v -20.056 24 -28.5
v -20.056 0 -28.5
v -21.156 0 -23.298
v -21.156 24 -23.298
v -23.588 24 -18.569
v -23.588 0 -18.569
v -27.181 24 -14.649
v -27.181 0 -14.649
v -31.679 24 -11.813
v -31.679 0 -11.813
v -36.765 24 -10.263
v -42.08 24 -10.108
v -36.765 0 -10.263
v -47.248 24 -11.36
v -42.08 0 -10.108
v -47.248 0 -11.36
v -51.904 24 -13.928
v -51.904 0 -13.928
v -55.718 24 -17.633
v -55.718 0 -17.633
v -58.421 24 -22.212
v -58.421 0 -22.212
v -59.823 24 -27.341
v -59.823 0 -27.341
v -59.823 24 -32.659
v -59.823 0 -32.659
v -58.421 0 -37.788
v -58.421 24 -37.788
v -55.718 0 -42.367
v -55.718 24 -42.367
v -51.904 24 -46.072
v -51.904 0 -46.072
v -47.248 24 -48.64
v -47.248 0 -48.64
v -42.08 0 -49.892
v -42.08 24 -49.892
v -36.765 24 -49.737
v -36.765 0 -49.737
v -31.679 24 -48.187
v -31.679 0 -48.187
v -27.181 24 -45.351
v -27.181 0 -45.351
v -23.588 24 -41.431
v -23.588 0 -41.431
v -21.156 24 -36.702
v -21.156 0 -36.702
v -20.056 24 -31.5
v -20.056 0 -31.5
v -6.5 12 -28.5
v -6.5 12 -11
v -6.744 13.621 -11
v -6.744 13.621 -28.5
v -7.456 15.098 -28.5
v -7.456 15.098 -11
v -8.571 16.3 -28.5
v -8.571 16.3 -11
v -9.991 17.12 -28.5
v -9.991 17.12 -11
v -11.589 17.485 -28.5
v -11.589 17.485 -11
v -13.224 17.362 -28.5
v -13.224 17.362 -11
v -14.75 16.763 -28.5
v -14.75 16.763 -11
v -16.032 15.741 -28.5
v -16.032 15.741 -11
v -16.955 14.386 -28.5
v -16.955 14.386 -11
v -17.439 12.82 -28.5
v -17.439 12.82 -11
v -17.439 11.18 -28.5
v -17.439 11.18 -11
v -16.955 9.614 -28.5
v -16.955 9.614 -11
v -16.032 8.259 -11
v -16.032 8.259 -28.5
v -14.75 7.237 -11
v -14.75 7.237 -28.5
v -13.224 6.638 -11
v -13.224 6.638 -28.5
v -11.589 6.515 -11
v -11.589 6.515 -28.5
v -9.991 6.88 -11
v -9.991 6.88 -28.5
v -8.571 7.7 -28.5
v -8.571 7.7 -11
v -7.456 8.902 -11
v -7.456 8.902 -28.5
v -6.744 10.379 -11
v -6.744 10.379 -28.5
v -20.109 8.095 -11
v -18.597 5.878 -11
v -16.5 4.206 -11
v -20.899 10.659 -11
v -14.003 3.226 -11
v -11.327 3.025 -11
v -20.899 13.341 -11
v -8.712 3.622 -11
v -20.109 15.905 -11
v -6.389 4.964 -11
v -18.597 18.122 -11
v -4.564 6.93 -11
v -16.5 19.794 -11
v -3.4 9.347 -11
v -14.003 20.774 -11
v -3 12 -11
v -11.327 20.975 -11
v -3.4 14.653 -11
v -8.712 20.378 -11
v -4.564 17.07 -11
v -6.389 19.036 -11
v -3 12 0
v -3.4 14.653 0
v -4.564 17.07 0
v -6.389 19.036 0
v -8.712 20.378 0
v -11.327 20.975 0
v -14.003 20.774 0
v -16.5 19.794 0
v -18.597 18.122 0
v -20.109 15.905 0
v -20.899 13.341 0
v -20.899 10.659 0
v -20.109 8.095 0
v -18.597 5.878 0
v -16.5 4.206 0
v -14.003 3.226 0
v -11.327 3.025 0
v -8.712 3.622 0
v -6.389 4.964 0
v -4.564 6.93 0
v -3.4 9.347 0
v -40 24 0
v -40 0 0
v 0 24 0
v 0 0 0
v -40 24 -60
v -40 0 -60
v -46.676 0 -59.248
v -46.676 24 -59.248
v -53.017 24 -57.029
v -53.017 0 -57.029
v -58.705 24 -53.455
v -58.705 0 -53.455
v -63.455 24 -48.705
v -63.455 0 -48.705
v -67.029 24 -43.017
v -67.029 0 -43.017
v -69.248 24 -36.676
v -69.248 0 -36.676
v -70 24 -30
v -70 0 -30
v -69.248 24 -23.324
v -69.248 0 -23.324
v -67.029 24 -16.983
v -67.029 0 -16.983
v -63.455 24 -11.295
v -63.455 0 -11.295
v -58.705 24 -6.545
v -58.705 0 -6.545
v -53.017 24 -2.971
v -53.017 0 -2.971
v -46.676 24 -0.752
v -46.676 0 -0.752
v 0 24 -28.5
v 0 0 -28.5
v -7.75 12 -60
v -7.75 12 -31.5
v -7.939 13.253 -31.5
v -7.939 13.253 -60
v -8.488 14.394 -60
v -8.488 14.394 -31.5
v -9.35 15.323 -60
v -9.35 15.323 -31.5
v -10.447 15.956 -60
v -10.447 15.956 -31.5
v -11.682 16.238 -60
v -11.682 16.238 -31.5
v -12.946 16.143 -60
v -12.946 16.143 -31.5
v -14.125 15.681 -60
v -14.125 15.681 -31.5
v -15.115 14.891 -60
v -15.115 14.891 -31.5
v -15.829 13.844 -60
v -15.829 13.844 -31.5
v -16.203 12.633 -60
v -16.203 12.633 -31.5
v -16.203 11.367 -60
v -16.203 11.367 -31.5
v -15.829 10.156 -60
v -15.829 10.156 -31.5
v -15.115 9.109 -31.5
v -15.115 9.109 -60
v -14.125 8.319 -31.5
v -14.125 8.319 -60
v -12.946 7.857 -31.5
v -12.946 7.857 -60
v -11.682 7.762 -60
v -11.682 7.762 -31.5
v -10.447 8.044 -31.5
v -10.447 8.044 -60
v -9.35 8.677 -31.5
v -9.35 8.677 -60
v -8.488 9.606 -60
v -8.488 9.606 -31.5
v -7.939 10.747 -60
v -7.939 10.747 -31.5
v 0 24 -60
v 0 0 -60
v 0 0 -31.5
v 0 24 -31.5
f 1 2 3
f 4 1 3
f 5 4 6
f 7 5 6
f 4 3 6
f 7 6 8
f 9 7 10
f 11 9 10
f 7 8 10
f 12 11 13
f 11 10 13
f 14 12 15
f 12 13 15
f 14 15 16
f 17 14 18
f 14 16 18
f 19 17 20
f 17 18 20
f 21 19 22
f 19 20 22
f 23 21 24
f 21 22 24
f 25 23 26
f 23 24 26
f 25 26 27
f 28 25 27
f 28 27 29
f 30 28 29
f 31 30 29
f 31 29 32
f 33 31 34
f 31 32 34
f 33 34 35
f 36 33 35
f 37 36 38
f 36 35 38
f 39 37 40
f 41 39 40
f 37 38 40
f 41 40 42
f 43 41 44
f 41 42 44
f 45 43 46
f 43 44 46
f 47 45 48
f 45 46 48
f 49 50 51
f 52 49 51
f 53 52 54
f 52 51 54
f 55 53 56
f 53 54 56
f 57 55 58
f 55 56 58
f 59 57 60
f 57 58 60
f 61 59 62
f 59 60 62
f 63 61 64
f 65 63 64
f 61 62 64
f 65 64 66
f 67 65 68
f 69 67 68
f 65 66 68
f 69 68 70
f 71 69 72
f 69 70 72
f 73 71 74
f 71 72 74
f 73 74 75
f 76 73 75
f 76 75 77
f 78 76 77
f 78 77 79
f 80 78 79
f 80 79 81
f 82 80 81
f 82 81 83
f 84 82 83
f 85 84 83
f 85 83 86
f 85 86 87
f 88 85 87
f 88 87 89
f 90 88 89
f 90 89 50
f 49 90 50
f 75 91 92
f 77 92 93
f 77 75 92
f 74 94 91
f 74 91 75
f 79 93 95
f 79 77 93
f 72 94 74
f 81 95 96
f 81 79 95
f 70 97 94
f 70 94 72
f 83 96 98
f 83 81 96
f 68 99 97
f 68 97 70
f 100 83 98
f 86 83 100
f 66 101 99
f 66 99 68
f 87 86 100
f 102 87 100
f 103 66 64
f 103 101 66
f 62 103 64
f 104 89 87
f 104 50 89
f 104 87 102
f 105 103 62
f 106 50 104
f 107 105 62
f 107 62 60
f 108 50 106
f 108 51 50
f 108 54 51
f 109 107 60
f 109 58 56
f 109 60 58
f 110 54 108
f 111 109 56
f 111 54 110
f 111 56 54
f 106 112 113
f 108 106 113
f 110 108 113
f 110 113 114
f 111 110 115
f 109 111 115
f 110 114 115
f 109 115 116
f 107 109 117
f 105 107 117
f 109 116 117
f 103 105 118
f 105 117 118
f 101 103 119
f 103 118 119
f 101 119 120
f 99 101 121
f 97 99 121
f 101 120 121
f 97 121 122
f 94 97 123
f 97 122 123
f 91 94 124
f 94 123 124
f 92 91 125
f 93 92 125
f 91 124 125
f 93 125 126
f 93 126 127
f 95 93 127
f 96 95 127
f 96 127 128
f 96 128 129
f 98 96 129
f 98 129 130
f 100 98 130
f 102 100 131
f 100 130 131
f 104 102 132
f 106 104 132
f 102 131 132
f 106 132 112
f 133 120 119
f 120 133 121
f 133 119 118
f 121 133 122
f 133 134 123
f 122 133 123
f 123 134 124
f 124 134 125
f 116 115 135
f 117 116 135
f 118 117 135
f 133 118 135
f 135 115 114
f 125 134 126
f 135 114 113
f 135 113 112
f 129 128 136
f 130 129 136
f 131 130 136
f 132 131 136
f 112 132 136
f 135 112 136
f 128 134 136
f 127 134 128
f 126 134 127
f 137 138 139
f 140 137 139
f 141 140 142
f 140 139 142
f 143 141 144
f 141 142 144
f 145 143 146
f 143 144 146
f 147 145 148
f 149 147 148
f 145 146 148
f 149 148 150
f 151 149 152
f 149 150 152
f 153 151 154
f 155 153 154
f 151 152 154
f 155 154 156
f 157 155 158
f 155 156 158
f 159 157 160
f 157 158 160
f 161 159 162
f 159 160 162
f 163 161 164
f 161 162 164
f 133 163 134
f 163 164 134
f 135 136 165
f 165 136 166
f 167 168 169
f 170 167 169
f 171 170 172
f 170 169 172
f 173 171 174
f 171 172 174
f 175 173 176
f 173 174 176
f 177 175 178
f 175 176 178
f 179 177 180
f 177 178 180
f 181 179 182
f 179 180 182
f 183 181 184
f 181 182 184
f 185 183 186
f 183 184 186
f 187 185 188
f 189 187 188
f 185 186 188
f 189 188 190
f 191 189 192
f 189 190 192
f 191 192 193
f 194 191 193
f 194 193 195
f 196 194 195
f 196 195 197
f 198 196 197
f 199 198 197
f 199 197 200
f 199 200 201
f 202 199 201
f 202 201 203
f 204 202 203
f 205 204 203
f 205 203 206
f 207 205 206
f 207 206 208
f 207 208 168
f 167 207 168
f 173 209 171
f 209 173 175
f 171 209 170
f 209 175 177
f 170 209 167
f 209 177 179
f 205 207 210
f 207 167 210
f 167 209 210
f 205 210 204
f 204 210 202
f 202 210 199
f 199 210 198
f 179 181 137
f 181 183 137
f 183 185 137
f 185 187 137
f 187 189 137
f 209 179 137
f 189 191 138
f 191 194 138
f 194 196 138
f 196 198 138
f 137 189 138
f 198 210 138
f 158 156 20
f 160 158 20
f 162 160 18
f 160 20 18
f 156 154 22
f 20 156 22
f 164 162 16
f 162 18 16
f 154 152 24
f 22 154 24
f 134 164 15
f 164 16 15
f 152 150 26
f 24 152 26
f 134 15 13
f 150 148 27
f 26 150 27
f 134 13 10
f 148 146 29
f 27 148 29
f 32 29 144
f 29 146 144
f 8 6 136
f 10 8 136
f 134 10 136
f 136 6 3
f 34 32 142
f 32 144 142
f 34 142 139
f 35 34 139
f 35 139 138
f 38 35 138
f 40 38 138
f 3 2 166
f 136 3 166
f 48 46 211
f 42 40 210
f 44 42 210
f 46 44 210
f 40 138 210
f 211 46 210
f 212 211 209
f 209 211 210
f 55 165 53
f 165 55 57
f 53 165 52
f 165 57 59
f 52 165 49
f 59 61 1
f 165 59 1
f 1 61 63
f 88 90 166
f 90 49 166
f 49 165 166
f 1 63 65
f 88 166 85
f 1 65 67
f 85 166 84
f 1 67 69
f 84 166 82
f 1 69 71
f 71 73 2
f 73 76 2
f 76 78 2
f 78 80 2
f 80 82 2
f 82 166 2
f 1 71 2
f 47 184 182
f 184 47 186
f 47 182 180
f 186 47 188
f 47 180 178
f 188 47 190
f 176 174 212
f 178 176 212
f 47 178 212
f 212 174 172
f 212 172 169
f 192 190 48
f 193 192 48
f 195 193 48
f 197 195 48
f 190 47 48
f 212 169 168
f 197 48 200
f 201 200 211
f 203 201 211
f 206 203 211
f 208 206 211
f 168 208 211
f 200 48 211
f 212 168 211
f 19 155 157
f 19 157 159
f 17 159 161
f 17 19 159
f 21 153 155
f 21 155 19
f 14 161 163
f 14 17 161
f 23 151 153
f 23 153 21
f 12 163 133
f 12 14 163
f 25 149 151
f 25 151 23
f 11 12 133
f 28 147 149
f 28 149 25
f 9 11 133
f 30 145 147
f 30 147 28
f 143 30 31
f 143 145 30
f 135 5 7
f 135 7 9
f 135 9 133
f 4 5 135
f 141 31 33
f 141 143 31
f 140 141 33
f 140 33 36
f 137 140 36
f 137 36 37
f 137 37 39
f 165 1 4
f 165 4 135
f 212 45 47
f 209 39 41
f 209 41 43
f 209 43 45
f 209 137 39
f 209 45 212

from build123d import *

# Parameters (mm, degrees)
P_IDAT_VYSUNUT_M1_DEPTH  = 24
ODEBRAT_VYSUNUT_M1_REACH = 62
SKICA2_R                 = 5.5
SKICA3_R                 = 9
ODEBRAT_VYSUNUT_M2_DEPTH = 11
M10_Z_VIT1_D             = 8.5
M10_Z_VIT1_DEPTH         = 28.5


with BuildPart() as part:
    # Skica1 → Přidat vysunutím1 (new body)
    with BuildSketch(Plane(origin=(0, 0, 0), x_dir=(1, 0, 0), z_dir=(0, 1, 0))):
        with BuildLine():
            Line((0, 0), (0, 28.5))
            Line((0, 28.5), (-20.056329325, 28.5))
            ThreePointArc((-20.056329325, 28.5), (-60, 30), (-20.056329325, 31.5))
            Line((-20.056329325, 31.5), (0, 31.5))
            Line((0, 31.5), (0, 60))
            Line((0, 60), (-40, 60))
            ThreePointArc((-40, 60), (-70, 30), (-40, 0))
            Line((-40, 0), (0, 0))
        make_face()
    extrude(amount=P_IDAT_VYSUNUT_M1_DEPTH)

    # Skica2 → Odebrat vysunutím1 (cut, up to next)
    with BuildSketch(Plane.XY, mode=Mode.PRIVATE) as odebrat_vysunut_m1_sk1:
        with Locations((-12, 12)):
            Circle(SKICA2_R)
    odebrat_vysunut_m1_tool1 = extrude(odebrat_vysunut_m1_sk1.sketch, amount=-ODEBRAT_VYSUNUT_M1_REACH, mode=Mode.PRIVATE) & part.part
    add(odebrat_vysunut_m1_tool1.solids().sort_by_distance((-12, 12, 0))[0], mode=Mode.SUBTRACT)

    # Skica3 → Odebrat vysunutím2 (cut)
    with BuildSketch(Plane.XY):
        with Locations((-12, 12)):
            Circle(SKICA3_R)
    extrude(amount=-ODEBRAT_VYSUNUT_M2_DEPTH, mode=Mode.SUBTRACT)

    # M10 závit1
    with Locations(Plane(origin=(0, 0, -60), x_dir=(-1, 0, 0), z_dir=(0, 0, -1))):
        with Locations((12, 12)):
            Hole(M10_Z_VIT1_D / 2, depth=M10_Z_VIT1_DEPTH)


solid = part.part
